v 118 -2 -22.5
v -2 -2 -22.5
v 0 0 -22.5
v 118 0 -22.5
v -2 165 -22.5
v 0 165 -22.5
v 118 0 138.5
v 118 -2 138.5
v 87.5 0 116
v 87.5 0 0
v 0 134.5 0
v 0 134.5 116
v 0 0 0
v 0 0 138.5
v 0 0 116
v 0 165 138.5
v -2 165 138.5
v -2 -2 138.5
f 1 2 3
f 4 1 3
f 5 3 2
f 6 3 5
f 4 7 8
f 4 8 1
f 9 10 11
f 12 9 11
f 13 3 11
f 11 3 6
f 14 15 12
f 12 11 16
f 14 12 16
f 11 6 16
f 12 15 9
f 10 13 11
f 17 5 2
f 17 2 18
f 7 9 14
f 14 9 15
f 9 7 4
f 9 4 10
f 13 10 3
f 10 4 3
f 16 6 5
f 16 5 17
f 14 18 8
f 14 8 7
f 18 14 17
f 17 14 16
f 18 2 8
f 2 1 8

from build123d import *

# Parameters (mm, degrees)
BOSS_EXTRUDE1_DEPTH = 116
SKETCH2_W           = 118
SKETCH2_H           = 161
BOSS_EXTRUDE2_DEPTH = 2
SKETCH3_W           = 161
SKETCH3_H           = 167
BOSS_EXTRUDE4_DEPTH = 2


with BuildPart() as part:
    # Sketch1 → Boss-Extrude1 (new body)
    with BuildSketch(Plane.XY):
        Polygon((0, 0), (87.5, 0), (0, 134.5), align=None)
    extrude(amount=BOSS_EXTRUDE1_DEPTH)

    # Sketch2 → Boss-Extrude2 (add)
    with BuildSketch(Plane(origin=(0, 0, 0), x_dir=(-1, 0, 0), z_dir=(0, -1, 0))):
        with Locations((-59, -58)):
            Rectangle(SKETCH2_W, SKETCH2_H)
    extrude(amount=BOSS_EXTRUDE2_DEPTH)

    # Sketch3 → Boss-Extrude4 (add)
    with BuildSketch(Plane.ZY):
        with Locations((58, 81.5)):
            Rectangle(SKETCH3_W, SKETCH3_H)
    extrude(amount=BOSS_EXTRUDE4_DEPTH)


solid = part.part
